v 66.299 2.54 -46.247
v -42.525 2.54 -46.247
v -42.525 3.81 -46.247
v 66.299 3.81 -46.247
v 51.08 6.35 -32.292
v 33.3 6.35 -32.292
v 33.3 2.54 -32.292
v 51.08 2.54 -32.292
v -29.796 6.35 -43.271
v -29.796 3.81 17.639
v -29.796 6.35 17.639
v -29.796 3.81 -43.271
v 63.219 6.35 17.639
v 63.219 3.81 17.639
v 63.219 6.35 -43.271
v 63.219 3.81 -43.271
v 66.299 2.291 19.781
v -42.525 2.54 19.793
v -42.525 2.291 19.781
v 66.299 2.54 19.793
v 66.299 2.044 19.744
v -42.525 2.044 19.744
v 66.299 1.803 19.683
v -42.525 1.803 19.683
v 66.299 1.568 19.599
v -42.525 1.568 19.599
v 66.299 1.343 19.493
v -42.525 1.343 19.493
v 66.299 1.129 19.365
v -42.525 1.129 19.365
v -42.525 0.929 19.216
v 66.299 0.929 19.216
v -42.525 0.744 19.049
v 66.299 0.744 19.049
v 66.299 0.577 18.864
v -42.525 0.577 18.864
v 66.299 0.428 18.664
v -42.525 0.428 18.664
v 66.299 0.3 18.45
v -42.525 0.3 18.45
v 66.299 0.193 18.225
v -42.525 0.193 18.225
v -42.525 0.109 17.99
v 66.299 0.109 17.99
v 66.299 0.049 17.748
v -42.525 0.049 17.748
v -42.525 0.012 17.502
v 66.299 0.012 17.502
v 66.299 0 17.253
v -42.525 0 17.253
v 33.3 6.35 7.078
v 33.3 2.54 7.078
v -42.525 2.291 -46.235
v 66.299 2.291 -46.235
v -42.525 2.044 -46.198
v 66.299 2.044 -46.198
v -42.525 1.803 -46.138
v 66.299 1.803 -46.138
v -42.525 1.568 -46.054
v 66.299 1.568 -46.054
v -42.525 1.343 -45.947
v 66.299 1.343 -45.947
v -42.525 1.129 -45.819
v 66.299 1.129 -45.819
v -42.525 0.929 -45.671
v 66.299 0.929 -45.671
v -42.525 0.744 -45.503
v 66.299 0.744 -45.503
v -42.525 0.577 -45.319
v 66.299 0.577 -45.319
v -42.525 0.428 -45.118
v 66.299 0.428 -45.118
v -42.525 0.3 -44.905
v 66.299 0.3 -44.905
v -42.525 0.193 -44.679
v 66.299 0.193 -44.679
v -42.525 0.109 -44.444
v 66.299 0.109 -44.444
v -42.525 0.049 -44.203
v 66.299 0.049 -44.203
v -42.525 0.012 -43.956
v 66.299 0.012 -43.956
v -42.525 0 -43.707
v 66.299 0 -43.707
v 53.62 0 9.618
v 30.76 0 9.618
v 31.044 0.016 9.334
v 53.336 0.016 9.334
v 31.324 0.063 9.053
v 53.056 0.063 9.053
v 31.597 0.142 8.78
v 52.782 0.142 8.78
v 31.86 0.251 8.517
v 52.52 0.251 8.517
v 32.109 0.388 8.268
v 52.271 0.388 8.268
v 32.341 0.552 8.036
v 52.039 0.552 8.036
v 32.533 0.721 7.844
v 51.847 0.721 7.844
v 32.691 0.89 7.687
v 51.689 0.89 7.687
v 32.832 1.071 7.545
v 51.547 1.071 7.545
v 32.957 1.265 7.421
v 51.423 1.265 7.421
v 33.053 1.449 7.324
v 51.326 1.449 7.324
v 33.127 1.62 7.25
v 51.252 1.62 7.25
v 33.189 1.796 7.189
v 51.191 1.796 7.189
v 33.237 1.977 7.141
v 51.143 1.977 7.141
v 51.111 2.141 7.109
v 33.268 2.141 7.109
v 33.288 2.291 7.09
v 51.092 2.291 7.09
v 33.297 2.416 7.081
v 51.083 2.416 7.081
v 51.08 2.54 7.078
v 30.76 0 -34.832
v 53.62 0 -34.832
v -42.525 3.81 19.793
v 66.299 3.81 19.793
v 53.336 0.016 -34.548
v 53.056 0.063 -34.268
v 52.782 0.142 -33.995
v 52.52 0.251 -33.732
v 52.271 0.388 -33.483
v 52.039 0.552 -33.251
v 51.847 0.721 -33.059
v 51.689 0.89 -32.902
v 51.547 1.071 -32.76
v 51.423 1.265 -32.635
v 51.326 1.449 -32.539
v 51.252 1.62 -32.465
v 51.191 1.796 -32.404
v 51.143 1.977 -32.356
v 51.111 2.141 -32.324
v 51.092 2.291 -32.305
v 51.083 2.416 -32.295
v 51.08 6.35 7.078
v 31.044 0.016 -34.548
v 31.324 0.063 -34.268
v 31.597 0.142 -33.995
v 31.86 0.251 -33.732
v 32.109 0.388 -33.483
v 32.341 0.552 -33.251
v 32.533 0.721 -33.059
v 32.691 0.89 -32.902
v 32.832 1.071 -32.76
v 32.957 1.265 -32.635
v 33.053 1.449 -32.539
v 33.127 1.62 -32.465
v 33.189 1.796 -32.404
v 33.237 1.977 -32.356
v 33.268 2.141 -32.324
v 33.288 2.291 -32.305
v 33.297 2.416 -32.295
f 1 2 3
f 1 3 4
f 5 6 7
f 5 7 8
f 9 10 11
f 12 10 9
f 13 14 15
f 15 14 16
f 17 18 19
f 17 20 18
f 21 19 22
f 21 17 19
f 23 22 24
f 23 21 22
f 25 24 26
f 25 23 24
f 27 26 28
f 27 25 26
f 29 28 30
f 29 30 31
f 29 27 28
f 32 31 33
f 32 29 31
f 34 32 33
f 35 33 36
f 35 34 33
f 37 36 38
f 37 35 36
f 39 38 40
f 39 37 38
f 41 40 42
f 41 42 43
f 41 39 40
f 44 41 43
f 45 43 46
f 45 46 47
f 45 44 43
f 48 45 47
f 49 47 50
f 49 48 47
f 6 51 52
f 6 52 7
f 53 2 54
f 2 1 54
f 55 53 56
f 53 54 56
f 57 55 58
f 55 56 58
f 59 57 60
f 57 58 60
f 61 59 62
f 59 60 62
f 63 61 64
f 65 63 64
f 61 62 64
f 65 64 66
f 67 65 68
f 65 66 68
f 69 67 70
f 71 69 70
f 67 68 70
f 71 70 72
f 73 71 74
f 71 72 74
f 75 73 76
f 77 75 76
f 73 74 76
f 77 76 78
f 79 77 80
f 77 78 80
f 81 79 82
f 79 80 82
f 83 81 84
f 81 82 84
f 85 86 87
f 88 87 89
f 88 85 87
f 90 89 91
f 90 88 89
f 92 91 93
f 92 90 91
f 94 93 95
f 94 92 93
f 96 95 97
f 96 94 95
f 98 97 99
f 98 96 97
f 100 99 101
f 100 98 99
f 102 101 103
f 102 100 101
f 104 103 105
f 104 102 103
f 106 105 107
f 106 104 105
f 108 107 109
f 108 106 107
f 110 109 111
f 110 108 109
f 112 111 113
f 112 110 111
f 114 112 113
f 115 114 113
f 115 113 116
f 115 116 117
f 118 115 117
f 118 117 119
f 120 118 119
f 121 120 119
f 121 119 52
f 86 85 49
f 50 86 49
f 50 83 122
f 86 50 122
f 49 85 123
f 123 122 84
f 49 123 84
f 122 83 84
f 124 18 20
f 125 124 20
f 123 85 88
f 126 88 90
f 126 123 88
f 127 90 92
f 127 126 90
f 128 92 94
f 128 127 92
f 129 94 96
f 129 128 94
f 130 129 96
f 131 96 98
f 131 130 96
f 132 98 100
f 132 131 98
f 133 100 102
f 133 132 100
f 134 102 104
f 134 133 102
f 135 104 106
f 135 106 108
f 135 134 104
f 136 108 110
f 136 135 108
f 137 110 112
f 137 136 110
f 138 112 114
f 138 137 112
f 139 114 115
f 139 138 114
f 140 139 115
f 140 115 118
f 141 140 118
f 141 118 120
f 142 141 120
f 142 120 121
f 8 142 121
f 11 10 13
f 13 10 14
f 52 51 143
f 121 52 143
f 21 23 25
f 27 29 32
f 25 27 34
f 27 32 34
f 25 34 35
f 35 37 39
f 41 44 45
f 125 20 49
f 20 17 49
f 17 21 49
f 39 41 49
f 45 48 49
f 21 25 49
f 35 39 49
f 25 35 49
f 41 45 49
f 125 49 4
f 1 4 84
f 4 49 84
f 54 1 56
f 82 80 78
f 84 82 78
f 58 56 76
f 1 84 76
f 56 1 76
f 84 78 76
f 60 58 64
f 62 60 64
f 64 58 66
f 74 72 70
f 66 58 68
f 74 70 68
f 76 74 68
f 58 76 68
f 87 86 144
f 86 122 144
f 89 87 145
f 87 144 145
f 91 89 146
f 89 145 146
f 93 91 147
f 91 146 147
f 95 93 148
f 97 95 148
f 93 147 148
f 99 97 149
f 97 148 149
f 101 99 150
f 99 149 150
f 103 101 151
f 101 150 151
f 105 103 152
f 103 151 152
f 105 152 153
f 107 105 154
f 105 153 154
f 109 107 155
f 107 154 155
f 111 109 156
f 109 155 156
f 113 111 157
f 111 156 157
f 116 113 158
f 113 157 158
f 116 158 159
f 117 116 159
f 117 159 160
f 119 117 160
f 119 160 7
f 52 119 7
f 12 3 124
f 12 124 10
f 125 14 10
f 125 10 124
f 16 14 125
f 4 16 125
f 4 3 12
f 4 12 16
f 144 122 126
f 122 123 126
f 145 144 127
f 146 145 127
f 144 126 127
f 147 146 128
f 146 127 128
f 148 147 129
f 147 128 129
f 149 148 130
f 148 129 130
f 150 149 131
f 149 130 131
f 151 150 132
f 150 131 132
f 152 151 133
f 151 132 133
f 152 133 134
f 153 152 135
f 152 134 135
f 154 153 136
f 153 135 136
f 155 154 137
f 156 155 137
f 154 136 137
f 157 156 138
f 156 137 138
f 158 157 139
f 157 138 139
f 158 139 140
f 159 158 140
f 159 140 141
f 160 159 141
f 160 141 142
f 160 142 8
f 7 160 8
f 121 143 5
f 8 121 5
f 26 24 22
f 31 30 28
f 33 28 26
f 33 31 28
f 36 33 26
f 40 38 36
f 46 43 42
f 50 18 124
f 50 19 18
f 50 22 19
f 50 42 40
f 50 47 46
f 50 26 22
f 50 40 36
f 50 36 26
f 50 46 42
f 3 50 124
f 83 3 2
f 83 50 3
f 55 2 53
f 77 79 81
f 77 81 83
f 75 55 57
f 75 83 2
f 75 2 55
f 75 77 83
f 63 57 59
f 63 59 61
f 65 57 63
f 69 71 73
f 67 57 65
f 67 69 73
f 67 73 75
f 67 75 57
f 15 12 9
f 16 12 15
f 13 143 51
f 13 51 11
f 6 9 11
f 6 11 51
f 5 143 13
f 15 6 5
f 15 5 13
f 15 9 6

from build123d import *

# Parameters (mm, degrees)
SKETCH1_W           = 108.824103019
SKETCH1_H           = 66.04
BOSS_EXTRUDE1_DEPTH = 3.81
SKETCH5_W           = 93.0148
SKETCH5_H           = 60.9092
BOSS_EXTRUDE2_DEPTH = 2.54
FILLET1_R           = 2.54
SKETCH6_W           = 17.78
SKETCH6_H           = 39.37
CUT_EXTRUDE1_DEPTH  = 7.366
FILLET2_R           = 2.54


with BuildPart() as part:
    # Sketch1 → Boss-Extrude1 (new body)
    with BuildSketch(Plane(origin=(0, 0, 0), x_dir=(1, 0, 0), z_dir=(0, 1, 0))):
        with Locations((11.887002401, 13.227171797)):
            Rectangle(SKETCH1_W, SKETCH1_H)
    extrude(amount=BOSS_EXTRUDE1_DEPTH)

    # Sketch5 → Boss-Extrude2 (add)
    with BuildSketch(Plane(origin=(0, 3.81, 0), x_dir=(1, 0, 0), z_dir=(0, 1, 0))):
        with Locations((16.711473858, 12.815998883)):
            Rectangle(SKETCH5_W, SKETCH5_H)
    extrude(amount=BOSS_EXTRUDE2_DEPTH)

    # Fillet1
    fillet1_edges = [part.edges().sort_by_distance(p)[0] for p in [
        (11.887002402, 0, -46.247171797),
        (11.887002402, 0, 19.792828203),
    ]]
    fillet(fillet1_edges, radius=FILLET1_R)

    # Sketch6 → Cut-Extrude1 (cut)
    with BuildSketch(Plane(origin=(0, 6.35, 0), x_dir=(1, 0, 0), z_dir=(0, 1, 0))):
        with Locations((42.189853997, 12.607362778)):
            Rectangle(SKETCH6_W, SKETCH6_H)
    extrude(amount=-CUT_EXTRUDE1_DEPTH, mode=Mode.SUBTRACT)

    # Fillet2
    fillet2_edges = [part.edges().sort_by_distance(p)[0] for p in [
        (42.189853997, 0, 7.077637222),
        (33.299853997, 0, -12.607362778),
        (42.189853997, 0, -32.292362778),
        (51.079853997, 0, -12.607362778),
    ]]
    fillet(fillet2_edges, radius=FILLET2_R)


solid = part.part
